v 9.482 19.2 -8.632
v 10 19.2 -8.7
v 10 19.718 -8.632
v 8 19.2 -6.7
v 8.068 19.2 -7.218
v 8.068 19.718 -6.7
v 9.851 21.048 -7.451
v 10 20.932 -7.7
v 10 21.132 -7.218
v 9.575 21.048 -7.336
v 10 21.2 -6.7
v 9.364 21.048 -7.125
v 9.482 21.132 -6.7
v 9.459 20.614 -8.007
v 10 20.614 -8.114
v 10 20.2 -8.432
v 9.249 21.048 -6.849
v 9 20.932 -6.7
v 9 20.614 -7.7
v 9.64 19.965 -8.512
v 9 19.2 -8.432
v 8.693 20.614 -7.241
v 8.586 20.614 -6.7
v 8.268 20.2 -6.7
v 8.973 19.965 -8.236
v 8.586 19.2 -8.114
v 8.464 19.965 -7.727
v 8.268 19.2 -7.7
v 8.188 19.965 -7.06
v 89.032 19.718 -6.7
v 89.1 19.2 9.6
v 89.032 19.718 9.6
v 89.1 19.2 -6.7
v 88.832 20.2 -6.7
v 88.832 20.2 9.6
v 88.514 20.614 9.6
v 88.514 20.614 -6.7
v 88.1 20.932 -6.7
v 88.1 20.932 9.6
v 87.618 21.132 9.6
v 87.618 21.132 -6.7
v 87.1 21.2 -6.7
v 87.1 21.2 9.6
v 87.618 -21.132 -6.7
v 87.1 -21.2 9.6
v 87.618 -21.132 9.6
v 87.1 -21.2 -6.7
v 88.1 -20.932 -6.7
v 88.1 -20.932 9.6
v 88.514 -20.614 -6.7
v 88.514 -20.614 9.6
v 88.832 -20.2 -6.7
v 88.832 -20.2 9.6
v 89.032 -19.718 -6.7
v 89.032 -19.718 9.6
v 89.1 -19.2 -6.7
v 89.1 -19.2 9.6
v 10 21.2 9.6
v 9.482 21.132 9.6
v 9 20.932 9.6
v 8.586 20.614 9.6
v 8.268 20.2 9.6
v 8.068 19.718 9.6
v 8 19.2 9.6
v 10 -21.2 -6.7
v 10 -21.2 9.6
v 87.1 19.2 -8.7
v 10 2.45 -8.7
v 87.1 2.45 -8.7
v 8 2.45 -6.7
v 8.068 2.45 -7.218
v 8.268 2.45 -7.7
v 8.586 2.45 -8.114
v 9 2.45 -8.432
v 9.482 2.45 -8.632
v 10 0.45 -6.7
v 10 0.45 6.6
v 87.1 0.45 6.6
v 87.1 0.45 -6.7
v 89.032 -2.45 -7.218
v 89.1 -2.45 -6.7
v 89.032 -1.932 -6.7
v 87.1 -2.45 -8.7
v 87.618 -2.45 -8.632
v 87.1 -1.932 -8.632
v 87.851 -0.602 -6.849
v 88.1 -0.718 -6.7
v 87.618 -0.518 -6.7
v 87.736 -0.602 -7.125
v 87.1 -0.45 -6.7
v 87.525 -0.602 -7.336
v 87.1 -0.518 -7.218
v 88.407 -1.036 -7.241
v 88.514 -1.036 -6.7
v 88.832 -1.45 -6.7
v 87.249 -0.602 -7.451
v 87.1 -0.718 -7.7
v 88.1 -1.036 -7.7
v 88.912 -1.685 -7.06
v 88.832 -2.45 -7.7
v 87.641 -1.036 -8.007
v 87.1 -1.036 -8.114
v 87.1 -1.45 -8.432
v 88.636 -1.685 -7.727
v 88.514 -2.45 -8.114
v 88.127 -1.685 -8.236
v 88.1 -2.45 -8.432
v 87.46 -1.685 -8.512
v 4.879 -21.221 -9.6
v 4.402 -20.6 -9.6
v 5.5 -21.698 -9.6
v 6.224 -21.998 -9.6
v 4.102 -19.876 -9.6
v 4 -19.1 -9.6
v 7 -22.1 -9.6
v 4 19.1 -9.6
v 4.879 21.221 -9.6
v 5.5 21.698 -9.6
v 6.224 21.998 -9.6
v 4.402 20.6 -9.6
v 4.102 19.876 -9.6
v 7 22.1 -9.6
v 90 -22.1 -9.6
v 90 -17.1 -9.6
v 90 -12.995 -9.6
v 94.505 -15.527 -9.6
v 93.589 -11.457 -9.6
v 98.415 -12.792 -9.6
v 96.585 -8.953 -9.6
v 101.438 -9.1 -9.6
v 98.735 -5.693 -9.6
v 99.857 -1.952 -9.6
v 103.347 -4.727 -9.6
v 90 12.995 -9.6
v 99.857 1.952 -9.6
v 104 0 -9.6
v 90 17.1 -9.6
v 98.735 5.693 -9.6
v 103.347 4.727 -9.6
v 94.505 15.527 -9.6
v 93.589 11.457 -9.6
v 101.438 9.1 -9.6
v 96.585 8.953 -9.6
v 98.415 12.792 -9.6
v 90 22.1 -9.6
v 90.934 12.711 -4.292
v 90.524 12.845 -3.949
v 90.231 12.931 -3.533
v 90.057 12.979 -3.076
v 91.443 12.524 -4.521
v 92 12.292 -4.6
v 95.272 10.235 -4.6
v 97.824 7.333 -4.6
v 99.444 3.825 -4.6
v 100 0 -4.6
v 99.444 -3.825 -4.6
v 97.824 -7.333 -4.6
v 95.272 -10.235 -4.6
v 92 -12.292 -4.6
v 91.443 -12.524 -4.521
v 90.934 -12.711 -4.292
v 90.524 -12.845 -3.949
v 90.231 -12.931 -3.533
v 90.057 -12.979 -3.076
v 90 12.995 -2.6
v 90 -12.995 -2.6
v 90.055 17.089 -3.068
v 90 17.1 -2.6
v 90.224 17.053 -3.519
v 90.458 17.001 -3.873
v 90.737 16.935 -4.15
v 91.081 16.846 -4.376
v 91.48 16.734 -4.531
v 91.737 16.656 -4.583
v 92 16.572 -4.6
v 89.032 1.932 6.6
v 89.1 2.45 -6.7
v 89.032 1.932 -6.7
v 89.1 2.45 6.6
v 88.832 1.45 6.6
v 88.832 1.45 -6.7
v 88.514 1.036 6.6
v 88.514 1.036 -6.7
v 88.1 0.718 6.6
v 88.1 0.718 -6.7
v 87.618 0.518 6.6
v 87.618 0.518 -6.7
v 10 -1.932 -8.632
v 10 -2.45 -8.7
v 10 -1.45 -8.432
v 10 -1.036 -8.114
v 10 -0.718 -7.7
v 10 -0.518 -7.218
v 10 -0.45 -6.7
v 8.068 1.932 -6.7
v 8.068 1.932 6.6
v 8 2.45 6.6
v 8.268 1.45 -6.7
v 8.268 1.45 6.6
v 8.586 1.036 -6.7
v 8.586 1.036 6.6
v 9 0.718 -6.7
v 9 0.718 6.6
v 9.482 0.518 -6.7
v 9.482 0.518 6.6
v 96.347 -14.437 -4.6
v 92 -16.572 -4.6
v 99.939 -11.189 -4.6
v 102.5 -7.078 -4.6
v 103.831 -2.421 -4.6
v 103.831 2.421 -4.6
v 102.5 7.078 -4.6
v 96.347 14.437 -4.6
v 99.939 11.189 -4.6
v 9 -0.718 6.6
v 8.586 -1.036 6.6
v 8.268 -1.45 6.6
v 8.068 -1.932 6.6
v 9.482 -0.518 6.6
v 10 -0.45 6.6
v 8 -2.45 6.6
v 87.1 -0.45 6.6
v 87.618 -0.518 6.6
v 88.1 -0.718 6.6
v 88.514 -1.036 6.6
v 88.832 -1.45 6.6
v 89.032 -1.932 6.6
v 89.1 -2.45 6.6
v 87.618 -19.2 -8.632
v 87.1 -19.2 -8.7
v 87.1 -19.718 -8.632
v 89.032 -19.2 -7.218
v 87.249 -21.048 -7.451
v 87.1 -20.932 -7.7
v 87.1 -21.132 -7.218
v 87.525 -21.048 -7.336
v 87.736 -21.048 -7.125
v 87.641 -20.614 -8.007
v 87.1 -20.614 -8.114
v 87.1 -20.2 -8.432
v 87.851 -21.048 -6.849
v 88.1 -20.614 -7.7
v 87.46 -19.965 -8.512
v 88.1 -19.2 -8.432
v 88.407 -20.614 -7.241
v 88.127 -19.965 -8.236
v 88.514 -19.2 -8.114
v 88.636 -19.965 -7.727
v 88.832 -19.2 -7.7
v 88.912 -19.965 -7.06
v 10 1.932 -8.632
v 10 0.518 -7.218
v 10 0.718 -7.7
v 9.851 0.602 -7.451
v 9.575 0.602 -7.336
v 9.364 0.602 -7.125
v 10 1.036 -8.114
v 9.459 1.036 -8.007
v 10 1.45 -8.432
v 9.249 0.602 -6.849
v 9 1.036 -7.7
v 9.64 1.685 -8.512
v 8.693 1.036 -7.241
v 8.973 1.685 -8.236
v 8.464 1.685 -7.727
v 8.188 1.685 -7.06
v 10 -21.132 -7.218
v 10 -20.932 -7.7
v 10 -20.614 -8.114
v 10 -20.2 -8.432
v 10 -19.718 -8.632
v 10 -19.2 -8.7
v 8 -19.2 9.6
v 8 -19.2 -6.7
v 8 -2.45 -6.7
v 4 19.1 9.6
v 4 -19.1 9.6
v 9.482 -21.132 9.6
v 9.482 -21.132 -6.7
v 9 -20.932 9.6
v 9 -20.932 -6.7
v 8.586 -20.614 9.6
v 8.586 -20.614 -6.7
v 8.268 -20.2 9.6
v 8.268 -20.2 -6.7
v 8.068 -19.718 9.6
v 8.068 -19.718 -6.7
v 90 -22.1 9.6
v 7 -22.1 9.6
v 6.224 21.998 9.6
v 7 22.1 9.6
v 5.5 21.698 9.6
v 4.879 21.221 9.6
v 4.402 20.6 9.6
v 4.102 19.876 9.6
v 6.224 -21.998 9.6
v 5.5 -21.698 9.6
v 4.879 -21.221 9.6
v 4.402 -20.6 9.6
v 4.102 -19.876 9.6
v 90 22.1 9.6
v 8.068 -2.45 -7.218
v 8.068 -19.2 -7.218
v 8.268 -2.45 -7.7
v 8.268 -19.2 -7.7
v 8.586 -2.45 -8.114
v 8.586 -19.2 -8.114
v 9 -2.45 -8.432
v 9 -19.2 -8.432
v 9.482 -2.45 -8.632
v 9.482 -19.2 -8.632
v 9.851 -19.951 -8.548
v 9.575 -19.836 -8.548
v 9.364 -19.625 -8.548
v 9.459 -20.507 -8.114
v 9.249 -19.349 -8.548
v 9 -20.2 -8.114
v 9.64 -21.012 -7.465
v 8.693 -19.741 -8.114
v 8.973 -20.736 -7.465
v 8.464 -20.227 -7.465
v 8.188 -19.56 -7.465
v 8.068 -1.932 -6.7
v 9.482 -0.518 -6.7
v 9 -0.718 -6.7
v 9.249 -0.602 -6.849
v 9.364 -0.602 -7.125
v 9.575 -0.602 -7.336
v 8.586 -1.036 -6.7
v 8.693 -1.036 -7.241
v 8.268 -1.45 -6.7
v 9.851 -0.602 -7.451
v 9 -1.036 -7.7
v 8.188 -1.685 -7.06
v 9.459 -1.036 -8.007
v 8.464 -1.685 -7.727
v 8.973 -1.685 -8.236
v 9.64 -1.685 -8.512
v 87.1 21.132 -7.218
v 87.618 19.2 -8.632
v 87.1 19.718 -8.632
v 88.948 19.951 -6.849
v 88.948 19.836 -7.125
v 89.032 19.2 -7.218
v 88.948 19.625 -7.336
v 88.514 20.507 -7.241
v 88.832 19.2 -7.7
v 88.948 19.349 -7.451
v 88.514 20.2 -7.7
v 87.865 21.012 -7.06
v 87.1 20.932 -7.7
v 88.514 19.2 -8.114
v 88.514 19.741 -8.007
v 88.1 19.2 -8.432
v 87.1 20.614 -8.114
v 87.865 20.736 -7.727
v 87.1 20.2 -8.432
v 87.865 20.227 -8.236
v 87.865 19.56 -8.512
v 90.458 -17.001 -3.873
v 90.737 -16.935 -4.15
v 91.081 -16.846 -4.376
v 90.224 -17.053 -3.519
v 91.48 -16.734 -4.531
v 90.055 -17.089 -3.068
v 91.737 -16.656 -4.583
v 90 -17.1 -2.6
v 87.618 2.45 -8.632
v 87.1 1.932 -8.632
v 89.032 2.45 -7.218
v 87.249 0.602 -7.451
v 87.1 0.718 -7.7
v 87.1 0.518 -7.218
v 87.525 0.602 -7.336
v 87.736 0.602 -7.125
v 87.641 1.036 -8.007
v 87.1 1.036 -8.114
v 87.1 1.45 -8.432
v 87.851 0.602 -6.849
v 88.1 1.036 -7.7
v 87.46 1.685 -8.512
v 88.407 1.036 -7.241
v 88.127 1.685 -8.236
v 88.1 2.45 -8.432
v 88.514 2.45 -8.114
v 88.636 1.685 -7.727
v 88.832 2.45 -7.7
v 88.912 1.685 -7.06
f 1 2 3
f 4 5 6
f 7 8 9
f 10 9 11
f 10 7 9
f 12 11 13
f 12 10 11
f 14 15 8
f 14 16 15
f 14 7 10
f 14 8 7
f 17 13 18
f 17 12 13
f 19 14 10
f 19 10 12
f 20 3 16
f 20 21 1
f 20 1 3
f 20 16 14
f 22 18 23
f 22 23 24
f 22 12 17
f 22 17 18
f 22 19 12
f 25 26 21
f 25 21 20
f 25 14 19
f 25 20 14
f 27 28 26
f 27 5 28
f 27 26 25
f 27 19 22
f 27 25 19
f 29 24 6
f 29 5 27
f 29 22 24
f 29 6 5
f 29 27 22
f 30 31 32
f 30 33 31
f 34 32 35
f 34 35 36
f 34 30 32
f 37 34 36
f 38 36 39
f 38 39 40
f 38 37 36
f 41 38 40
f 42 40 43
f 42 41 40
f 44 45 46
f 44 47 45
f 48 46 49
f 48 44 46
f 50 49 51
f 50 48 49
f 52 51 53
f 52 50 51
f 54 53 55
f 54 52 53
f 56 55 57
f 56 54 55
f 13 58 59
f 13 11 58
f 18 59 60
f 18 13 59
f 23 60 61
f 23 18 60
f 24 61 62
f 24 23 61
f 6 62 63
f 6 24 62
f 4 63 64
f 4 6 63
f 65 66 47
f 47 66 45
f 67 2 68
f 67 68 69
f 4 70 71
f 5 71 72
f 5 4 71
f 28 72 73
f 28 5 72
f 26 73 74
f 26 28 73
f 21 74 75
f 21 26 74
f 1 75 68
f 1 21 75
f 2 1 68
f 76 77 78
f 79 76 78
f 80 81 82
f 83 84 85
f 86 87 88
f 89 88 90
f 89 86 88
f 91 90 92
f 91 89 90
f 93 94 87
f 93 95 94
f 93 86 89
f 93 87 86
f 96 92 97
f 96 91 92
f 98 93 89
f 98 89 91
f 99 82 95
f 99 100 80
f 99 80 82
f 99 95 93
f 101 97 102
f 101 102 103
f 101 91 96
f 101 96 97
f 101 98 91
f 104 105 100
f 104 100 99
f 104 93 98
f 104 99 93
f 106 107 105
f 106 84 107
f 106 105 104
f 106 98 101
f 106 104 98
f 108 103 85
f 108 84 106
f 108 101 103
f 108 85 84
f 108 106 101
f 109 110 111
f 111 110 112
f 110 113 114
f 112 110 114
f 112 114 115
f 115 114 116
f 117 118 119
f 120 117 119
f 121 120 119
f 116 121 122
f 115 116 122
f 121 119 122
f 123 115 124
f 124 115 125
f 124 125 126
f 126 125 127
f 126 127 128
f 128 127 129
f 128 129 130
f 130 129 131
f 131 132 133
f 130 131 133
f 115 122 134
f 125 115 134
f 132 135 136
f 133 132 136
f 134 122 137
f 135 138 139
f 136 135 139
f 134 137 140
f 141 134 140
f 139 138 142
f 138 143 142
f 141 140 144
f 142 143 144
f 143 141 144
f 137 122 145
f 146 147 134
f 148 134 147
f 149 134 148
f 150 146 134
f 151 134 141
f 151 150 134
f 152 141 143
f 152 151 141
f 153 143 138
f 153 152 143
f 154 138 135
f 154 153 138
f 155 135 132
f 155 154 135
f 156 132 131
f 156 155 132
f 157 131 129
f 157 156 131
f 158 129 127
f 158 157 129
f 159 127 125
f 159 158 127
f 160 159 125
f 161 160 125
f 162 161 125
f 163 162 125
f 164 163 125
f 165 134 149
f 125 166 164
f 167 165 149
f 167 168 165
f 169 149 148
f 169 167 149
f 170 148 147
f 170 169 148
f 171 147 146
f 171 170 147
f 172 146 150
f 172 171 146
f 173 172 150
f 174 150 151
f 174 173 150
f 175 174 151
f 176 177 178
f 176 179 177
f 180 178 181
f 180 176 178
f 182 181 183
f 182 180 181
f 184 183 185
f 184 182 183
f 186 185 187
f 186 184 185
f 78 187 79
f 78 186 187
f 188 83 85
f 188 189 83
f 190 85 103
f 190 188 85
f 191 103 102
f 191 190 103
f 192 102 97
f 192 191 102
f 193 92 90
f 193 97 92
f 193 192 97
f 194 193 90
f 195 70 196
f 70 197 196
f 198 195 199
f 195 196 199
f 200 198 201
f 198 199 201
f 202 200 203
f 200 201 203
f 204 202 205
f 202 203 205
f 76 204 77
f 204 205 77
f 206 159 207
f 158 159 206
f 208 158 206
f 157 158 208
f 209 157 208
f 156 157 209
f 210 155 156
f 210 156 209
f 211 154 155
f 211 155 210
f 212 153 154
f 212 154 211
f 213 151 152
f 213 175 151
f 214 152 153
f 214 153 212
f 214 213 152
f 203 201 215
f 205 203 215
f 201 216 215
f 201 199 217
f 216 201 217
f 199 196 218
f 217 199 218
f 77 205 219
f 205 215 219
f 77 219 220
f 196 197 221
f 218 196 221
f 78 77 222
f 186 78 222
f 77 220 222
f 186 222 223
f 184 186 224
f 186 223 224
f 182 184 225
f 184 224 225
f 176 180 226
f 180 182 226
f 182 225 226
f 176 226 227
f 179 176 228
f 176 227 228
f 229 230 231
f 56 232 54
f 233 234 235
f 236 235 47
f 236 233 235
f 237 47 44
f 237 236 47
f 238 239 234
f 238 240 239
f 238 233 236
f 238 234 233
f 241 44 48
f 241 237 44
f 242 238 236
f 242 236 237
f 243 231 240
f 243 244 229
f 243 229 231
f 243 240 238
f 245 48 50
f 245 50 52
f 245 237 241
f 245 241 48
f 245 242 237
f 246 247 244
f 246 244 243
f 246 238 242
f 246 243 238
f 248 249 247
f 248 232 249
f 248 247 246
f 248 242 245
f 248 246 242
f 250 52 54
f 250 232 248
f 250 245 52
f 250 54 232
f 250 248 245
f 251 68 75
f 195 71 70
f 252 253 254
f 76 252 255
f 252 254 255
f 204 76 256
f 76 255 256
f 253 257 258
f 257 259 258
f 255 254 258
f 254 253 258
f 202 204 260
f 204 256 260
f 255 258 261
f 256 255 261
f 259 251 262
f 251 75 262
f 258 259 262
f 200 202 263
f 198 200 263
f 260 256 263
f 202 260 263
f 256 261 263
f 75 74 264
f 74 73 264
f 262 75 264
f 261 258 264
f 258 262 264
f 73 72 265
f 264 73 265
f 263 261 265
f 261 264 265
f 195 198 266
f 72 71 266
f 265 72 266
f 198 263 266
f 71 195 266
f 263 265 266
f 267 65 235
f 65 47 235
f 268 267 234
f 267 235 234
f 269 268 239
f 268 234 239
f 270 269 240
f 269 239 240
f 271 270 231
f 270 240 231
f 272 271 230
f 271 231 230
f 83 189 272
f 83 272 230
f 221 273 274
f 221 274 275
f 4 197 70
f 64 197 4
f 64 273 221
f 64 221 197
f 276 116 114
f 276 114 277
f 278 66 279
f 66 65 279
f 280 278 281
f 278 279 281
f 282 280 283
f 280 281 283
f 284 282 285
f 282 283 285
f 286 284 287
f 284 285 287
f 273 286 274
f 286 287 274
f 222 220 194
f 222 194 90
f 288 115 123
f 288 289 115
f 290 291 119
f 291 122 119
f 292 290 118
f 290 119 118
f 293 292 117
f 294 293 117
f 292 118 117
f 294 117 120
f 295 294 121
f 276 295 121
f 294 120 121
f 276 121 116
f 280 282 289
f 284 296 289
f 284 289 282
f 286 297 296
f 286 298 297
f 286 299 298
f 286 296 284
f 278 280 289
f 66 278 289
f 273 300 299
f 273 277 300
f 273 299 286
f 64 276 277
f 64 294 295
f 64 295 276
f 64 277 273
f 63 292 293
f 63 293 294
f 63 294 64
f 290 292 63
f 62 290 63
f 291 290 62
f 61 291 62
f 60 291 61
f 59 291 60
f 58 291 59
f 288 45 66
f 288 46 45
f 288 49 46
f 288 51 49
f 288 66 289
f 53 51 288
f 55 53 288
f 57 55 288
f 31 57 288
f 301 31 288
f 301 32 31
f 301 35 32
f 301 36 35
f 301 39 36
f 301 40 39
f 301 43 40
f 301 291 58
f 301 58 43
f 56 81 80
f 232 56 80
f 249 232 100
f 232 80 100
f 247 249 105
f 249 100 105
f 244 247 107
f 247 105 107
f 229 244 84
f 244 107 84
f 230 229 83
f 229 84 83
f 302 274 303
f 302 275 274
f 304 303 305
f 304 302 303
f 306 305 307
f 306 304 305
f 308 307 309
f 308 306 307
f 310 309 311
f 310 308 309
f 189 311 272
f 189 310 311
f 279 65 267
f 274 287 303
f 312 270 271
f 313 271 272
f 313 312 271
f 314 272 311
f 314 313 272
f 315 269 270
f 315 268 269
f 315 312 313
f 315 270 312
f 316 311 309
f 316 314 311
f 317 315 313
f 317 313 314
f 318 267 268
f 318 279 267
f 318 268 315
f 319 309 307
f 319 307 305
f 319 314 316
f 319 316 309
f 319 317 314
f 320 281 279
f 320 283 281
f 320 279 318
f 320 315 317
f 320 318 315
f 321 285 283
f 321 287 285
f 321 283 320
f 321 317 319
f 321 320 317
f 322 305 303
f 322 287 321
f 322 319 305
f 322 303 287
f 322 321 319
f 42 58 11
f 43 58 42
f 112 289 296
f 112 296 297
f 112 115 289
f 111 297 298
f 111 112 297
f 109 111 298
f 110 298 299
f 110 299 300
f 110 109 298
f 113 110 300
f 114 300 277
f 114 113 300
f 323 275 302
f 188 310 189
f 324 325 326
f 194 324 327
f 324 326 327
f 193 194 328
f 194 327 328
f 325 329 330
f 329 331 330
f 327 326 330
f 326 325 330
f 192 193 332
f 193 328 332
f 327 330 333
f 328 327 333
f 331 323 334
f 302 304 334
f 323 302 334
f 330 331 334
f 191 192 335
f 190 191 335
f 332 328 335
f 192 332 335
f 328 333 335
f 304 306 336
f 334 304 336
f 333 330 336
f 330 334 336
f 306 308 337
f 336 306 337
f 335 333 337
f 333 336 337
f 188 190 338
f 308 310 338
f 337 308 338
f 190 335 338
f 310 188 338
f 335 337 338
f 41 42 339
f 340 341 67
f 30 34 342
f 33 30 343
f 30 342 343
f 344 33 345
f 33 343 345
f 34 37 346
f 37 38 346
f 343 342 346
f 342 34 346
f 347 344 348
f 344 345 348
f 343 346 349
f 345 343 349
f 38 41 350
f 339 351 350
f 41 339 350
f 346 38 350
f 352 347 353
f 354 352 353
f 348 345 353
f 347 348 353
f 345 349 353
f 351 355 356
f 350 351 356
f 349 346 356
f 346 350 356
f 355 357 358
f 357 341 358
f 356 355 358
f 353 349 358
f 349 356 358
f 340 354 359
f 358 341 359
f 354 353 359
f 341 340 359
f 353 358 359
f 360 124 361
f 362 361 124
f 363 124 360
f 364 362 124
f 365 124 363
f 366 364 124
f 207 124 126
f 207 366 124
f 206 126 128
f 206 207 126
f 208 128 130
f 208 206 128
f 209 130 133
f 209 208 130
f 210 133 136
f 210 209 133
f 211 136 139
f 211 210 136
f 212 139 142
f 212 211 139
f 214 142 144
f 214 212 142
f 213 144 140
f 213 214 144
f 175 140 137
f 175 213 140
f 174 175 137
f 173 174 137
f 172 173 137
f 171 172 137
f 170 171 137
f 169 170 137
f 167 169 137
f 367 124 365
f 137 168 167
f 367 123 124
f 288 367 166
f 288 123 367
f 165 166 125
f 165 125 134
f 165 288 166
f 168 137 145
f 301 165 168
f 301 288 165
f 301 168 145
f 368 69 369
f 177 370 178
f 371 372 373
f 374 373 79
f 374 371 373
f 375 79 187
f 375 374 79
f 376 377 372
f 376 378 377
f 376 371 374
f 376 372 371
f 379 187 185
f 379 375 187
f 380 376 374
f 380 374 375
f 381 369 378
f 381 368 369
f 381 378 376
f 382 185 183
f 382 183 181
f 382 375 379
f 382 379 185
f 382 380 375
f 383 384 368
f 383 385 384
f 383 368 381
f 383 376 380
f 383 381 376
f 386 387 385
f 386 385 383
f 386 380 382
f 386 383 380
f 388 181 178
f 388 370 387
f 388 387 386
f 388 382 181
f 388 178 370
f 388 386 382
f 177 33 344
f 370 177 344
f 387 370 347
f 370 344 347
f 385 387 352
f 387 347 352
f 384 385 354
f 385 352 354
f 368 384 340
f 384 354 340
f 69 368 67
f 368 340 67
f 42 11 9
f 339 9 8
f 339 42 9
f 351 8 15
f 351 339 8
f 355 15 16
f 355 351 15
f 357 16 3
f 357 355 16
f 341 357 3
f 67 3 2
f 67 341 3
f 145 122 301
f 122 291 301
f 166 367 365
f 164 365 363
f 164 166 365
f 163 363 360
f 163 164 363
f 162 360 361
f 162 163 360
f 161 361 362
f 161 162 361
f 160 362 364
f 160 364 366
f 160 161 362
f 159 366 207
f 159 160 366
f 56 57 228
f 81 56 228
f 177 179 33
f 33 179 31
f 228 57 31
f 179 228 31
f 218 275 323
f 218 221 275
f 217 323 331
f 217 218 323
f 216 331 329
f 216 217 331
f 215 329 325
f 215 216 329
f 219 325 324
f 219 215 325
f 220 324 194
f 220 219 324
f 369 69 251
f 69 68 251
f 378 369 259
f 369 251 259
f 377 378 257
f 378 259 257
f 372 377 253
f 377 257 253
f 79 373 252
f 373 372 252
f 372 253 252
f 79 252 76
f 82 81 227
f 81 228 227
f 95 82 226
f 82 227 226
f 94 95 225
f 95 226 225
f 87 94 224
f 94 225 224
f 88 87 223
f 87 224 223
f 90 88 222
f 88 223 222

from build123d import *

# Parameters (mm, degrees)
SKETCH_1_W                  = 86
SKETCH_1_H                  = 44.2
EXTRUDE_1_DEPTH             = 14.2
EXTRUDE_2_DEPTH             = 5
SKETCH_3_W                  = 81.1
SKETCH_3_H                  = 42.4
CUT_EXTRUDE_1_DEPTH         = 18.3
HOLE_WIZARD_8_3_8_3_1_D     = 8.3
HOLE_WIZARD_8_3_8_3_1_DEPTH = 3.2
RIB_1_REACH                 = 108.755
SKETCH_6_WALL_W             = 296.60943773
SKETCH_6_WALL_H             = 0.9
FILLET_1_R                  = 3
EXTRUDE_START               = -3.5
SKETCH_7_R                  = 4.15
EXTRUDE_3_DEPTH             = 3.5
FILLET_2_R                  = 2


with BuildPart() as part:
    # Эскиз1 → Бобышка-Вытянуть1 (new body)
    with BuildSketch(Plane.XY.offset(9.6)):
        with Locations((47, 0)):
            Rectangle(SKETCH_1_W, SKETCH_1_H)
    extrude(amount=-EXTRUDE_1_DEPTH)

    # Эскиз2 → Бобышка-Вытянуть2 (add)
    with BuildSketch(Plane(origin=(0, 0, -4.6), x_dir=(-1, 0, 0), z_dir=(0, 0, -1))):
        with BuildLine():
            Line((-90, -22.1), (-90, -17.1))
            ThreePointArc((-90, -17.1), (-104, 0), (-90, 17.1))
            Line((-90, 17.1), (-90, 22.1))
            Line((-90, 22.1), (-4, 22.1))
            Line((-4, 22.1), (-4, -22.1))
            Line((-4, -22.1), (-90, -22.1))
        make_face()
        with BuildLine():
            Line((-90, -12.994779171), (-90, 12.994779171))
            ThreePointArc((-90, 12.994779171), (-100, 0), (-90, -12.994779171))
        make_face(mode=Mode.SUBTRACT)
    extrude(amount=EXTRUDE_2_DEPTH)

    # Эскиз3 → Вырез-Вытянуть1 (cut)
    with BuildSketch(Plane.XY.offset(9.6)):
        with Locations((48.55, 0)):
            Rectangle(SKETCH_3_W, SKETCH_3_H)
    extrude(amount=-CUT_EXTRUDE_1_DEPTH, mode=Mode.SUBTRACT)

    # Диаметр отверстия Ø8.3 (8.3)1
    with Locations(Plane.ZY.offset(-4)):
        with Locations((0, 0)):
            Hole(HOLE_WIZARD_8_3_8_3_1_D / 2, depth=HOLE_WIZARD_8_3_8_3_1_DEPTH)

    # Эскиз6 wall → Ребро1 (add, up to next)
    with BuildSketch(Plane(origin=(48.55, 0, 6.6), x_dir=(1, 0, 0), z_dir=(0, 0, -1)), mode=Mode.PRIVATE) as rib_1_sk1:
        Rectangle(SKETCH_6_WALL_W, SKETCH_6_WALL_H)
    rib_1_tool1 = extrude(rib_1_sk1.sketch, amount=RIB_1_REACH, mode=Mode.PRIVATE) - part.part
    add(rib_1_tool1.solids().sort_by_distance((48.55, 0, 6.6))[0])

    # Скругление1
    fillet_1_edges = [part.edges().sort_by_distance(p)[0] for p in [
        (4, -22.1, 0),
        (4, 22.1, 0),
    ]]
    fillet(fillet_1_edges, radius=FILLET_1_R)

    # Эскиз7 → Бобышка-Вытянуть3 (add)
    with BuildSketch(Plane.ZY.offset(-4).offset(EXTRUDE_START)):
        Circle(SKETCH_7_R)
    extrude(amount=EXTRUDE_3_DEPTH)

    # Скругление2
    fillet_2_edges = [part.edges().sort_by_distance(p)[0] for p in [
        (90, -15.047389586, -4.6),
        (90, 15.047389586, -4.6),
        (8, 10.825, -8.7),
        (8, -21.2, 0.45),
        (48.55, 21.2, -8.7),
        (8, 21.2, 0.45),
        (89.1, -10.825, -8.7),
        (89.1, 21.2, 0.45),
        (48.55, -21.2, -8.7),
        (89.1, -21.2, 0.45),
        (8, -10.825, -8.7),
        (89.1, 10.825, -8.7),
        (48.55, 0.45, -8.7),
        (8, 0.45, -1.05),
        (89.1, 0.45, -1.05),
        (8, -0.45, -1.05),
        (89.1, -0.45, -1.05),
        (48.55, -0.45, -8.7),
    ]]
    fillet(fillet_2_edges, radius=FILLET_2_R)


solid = part.part
